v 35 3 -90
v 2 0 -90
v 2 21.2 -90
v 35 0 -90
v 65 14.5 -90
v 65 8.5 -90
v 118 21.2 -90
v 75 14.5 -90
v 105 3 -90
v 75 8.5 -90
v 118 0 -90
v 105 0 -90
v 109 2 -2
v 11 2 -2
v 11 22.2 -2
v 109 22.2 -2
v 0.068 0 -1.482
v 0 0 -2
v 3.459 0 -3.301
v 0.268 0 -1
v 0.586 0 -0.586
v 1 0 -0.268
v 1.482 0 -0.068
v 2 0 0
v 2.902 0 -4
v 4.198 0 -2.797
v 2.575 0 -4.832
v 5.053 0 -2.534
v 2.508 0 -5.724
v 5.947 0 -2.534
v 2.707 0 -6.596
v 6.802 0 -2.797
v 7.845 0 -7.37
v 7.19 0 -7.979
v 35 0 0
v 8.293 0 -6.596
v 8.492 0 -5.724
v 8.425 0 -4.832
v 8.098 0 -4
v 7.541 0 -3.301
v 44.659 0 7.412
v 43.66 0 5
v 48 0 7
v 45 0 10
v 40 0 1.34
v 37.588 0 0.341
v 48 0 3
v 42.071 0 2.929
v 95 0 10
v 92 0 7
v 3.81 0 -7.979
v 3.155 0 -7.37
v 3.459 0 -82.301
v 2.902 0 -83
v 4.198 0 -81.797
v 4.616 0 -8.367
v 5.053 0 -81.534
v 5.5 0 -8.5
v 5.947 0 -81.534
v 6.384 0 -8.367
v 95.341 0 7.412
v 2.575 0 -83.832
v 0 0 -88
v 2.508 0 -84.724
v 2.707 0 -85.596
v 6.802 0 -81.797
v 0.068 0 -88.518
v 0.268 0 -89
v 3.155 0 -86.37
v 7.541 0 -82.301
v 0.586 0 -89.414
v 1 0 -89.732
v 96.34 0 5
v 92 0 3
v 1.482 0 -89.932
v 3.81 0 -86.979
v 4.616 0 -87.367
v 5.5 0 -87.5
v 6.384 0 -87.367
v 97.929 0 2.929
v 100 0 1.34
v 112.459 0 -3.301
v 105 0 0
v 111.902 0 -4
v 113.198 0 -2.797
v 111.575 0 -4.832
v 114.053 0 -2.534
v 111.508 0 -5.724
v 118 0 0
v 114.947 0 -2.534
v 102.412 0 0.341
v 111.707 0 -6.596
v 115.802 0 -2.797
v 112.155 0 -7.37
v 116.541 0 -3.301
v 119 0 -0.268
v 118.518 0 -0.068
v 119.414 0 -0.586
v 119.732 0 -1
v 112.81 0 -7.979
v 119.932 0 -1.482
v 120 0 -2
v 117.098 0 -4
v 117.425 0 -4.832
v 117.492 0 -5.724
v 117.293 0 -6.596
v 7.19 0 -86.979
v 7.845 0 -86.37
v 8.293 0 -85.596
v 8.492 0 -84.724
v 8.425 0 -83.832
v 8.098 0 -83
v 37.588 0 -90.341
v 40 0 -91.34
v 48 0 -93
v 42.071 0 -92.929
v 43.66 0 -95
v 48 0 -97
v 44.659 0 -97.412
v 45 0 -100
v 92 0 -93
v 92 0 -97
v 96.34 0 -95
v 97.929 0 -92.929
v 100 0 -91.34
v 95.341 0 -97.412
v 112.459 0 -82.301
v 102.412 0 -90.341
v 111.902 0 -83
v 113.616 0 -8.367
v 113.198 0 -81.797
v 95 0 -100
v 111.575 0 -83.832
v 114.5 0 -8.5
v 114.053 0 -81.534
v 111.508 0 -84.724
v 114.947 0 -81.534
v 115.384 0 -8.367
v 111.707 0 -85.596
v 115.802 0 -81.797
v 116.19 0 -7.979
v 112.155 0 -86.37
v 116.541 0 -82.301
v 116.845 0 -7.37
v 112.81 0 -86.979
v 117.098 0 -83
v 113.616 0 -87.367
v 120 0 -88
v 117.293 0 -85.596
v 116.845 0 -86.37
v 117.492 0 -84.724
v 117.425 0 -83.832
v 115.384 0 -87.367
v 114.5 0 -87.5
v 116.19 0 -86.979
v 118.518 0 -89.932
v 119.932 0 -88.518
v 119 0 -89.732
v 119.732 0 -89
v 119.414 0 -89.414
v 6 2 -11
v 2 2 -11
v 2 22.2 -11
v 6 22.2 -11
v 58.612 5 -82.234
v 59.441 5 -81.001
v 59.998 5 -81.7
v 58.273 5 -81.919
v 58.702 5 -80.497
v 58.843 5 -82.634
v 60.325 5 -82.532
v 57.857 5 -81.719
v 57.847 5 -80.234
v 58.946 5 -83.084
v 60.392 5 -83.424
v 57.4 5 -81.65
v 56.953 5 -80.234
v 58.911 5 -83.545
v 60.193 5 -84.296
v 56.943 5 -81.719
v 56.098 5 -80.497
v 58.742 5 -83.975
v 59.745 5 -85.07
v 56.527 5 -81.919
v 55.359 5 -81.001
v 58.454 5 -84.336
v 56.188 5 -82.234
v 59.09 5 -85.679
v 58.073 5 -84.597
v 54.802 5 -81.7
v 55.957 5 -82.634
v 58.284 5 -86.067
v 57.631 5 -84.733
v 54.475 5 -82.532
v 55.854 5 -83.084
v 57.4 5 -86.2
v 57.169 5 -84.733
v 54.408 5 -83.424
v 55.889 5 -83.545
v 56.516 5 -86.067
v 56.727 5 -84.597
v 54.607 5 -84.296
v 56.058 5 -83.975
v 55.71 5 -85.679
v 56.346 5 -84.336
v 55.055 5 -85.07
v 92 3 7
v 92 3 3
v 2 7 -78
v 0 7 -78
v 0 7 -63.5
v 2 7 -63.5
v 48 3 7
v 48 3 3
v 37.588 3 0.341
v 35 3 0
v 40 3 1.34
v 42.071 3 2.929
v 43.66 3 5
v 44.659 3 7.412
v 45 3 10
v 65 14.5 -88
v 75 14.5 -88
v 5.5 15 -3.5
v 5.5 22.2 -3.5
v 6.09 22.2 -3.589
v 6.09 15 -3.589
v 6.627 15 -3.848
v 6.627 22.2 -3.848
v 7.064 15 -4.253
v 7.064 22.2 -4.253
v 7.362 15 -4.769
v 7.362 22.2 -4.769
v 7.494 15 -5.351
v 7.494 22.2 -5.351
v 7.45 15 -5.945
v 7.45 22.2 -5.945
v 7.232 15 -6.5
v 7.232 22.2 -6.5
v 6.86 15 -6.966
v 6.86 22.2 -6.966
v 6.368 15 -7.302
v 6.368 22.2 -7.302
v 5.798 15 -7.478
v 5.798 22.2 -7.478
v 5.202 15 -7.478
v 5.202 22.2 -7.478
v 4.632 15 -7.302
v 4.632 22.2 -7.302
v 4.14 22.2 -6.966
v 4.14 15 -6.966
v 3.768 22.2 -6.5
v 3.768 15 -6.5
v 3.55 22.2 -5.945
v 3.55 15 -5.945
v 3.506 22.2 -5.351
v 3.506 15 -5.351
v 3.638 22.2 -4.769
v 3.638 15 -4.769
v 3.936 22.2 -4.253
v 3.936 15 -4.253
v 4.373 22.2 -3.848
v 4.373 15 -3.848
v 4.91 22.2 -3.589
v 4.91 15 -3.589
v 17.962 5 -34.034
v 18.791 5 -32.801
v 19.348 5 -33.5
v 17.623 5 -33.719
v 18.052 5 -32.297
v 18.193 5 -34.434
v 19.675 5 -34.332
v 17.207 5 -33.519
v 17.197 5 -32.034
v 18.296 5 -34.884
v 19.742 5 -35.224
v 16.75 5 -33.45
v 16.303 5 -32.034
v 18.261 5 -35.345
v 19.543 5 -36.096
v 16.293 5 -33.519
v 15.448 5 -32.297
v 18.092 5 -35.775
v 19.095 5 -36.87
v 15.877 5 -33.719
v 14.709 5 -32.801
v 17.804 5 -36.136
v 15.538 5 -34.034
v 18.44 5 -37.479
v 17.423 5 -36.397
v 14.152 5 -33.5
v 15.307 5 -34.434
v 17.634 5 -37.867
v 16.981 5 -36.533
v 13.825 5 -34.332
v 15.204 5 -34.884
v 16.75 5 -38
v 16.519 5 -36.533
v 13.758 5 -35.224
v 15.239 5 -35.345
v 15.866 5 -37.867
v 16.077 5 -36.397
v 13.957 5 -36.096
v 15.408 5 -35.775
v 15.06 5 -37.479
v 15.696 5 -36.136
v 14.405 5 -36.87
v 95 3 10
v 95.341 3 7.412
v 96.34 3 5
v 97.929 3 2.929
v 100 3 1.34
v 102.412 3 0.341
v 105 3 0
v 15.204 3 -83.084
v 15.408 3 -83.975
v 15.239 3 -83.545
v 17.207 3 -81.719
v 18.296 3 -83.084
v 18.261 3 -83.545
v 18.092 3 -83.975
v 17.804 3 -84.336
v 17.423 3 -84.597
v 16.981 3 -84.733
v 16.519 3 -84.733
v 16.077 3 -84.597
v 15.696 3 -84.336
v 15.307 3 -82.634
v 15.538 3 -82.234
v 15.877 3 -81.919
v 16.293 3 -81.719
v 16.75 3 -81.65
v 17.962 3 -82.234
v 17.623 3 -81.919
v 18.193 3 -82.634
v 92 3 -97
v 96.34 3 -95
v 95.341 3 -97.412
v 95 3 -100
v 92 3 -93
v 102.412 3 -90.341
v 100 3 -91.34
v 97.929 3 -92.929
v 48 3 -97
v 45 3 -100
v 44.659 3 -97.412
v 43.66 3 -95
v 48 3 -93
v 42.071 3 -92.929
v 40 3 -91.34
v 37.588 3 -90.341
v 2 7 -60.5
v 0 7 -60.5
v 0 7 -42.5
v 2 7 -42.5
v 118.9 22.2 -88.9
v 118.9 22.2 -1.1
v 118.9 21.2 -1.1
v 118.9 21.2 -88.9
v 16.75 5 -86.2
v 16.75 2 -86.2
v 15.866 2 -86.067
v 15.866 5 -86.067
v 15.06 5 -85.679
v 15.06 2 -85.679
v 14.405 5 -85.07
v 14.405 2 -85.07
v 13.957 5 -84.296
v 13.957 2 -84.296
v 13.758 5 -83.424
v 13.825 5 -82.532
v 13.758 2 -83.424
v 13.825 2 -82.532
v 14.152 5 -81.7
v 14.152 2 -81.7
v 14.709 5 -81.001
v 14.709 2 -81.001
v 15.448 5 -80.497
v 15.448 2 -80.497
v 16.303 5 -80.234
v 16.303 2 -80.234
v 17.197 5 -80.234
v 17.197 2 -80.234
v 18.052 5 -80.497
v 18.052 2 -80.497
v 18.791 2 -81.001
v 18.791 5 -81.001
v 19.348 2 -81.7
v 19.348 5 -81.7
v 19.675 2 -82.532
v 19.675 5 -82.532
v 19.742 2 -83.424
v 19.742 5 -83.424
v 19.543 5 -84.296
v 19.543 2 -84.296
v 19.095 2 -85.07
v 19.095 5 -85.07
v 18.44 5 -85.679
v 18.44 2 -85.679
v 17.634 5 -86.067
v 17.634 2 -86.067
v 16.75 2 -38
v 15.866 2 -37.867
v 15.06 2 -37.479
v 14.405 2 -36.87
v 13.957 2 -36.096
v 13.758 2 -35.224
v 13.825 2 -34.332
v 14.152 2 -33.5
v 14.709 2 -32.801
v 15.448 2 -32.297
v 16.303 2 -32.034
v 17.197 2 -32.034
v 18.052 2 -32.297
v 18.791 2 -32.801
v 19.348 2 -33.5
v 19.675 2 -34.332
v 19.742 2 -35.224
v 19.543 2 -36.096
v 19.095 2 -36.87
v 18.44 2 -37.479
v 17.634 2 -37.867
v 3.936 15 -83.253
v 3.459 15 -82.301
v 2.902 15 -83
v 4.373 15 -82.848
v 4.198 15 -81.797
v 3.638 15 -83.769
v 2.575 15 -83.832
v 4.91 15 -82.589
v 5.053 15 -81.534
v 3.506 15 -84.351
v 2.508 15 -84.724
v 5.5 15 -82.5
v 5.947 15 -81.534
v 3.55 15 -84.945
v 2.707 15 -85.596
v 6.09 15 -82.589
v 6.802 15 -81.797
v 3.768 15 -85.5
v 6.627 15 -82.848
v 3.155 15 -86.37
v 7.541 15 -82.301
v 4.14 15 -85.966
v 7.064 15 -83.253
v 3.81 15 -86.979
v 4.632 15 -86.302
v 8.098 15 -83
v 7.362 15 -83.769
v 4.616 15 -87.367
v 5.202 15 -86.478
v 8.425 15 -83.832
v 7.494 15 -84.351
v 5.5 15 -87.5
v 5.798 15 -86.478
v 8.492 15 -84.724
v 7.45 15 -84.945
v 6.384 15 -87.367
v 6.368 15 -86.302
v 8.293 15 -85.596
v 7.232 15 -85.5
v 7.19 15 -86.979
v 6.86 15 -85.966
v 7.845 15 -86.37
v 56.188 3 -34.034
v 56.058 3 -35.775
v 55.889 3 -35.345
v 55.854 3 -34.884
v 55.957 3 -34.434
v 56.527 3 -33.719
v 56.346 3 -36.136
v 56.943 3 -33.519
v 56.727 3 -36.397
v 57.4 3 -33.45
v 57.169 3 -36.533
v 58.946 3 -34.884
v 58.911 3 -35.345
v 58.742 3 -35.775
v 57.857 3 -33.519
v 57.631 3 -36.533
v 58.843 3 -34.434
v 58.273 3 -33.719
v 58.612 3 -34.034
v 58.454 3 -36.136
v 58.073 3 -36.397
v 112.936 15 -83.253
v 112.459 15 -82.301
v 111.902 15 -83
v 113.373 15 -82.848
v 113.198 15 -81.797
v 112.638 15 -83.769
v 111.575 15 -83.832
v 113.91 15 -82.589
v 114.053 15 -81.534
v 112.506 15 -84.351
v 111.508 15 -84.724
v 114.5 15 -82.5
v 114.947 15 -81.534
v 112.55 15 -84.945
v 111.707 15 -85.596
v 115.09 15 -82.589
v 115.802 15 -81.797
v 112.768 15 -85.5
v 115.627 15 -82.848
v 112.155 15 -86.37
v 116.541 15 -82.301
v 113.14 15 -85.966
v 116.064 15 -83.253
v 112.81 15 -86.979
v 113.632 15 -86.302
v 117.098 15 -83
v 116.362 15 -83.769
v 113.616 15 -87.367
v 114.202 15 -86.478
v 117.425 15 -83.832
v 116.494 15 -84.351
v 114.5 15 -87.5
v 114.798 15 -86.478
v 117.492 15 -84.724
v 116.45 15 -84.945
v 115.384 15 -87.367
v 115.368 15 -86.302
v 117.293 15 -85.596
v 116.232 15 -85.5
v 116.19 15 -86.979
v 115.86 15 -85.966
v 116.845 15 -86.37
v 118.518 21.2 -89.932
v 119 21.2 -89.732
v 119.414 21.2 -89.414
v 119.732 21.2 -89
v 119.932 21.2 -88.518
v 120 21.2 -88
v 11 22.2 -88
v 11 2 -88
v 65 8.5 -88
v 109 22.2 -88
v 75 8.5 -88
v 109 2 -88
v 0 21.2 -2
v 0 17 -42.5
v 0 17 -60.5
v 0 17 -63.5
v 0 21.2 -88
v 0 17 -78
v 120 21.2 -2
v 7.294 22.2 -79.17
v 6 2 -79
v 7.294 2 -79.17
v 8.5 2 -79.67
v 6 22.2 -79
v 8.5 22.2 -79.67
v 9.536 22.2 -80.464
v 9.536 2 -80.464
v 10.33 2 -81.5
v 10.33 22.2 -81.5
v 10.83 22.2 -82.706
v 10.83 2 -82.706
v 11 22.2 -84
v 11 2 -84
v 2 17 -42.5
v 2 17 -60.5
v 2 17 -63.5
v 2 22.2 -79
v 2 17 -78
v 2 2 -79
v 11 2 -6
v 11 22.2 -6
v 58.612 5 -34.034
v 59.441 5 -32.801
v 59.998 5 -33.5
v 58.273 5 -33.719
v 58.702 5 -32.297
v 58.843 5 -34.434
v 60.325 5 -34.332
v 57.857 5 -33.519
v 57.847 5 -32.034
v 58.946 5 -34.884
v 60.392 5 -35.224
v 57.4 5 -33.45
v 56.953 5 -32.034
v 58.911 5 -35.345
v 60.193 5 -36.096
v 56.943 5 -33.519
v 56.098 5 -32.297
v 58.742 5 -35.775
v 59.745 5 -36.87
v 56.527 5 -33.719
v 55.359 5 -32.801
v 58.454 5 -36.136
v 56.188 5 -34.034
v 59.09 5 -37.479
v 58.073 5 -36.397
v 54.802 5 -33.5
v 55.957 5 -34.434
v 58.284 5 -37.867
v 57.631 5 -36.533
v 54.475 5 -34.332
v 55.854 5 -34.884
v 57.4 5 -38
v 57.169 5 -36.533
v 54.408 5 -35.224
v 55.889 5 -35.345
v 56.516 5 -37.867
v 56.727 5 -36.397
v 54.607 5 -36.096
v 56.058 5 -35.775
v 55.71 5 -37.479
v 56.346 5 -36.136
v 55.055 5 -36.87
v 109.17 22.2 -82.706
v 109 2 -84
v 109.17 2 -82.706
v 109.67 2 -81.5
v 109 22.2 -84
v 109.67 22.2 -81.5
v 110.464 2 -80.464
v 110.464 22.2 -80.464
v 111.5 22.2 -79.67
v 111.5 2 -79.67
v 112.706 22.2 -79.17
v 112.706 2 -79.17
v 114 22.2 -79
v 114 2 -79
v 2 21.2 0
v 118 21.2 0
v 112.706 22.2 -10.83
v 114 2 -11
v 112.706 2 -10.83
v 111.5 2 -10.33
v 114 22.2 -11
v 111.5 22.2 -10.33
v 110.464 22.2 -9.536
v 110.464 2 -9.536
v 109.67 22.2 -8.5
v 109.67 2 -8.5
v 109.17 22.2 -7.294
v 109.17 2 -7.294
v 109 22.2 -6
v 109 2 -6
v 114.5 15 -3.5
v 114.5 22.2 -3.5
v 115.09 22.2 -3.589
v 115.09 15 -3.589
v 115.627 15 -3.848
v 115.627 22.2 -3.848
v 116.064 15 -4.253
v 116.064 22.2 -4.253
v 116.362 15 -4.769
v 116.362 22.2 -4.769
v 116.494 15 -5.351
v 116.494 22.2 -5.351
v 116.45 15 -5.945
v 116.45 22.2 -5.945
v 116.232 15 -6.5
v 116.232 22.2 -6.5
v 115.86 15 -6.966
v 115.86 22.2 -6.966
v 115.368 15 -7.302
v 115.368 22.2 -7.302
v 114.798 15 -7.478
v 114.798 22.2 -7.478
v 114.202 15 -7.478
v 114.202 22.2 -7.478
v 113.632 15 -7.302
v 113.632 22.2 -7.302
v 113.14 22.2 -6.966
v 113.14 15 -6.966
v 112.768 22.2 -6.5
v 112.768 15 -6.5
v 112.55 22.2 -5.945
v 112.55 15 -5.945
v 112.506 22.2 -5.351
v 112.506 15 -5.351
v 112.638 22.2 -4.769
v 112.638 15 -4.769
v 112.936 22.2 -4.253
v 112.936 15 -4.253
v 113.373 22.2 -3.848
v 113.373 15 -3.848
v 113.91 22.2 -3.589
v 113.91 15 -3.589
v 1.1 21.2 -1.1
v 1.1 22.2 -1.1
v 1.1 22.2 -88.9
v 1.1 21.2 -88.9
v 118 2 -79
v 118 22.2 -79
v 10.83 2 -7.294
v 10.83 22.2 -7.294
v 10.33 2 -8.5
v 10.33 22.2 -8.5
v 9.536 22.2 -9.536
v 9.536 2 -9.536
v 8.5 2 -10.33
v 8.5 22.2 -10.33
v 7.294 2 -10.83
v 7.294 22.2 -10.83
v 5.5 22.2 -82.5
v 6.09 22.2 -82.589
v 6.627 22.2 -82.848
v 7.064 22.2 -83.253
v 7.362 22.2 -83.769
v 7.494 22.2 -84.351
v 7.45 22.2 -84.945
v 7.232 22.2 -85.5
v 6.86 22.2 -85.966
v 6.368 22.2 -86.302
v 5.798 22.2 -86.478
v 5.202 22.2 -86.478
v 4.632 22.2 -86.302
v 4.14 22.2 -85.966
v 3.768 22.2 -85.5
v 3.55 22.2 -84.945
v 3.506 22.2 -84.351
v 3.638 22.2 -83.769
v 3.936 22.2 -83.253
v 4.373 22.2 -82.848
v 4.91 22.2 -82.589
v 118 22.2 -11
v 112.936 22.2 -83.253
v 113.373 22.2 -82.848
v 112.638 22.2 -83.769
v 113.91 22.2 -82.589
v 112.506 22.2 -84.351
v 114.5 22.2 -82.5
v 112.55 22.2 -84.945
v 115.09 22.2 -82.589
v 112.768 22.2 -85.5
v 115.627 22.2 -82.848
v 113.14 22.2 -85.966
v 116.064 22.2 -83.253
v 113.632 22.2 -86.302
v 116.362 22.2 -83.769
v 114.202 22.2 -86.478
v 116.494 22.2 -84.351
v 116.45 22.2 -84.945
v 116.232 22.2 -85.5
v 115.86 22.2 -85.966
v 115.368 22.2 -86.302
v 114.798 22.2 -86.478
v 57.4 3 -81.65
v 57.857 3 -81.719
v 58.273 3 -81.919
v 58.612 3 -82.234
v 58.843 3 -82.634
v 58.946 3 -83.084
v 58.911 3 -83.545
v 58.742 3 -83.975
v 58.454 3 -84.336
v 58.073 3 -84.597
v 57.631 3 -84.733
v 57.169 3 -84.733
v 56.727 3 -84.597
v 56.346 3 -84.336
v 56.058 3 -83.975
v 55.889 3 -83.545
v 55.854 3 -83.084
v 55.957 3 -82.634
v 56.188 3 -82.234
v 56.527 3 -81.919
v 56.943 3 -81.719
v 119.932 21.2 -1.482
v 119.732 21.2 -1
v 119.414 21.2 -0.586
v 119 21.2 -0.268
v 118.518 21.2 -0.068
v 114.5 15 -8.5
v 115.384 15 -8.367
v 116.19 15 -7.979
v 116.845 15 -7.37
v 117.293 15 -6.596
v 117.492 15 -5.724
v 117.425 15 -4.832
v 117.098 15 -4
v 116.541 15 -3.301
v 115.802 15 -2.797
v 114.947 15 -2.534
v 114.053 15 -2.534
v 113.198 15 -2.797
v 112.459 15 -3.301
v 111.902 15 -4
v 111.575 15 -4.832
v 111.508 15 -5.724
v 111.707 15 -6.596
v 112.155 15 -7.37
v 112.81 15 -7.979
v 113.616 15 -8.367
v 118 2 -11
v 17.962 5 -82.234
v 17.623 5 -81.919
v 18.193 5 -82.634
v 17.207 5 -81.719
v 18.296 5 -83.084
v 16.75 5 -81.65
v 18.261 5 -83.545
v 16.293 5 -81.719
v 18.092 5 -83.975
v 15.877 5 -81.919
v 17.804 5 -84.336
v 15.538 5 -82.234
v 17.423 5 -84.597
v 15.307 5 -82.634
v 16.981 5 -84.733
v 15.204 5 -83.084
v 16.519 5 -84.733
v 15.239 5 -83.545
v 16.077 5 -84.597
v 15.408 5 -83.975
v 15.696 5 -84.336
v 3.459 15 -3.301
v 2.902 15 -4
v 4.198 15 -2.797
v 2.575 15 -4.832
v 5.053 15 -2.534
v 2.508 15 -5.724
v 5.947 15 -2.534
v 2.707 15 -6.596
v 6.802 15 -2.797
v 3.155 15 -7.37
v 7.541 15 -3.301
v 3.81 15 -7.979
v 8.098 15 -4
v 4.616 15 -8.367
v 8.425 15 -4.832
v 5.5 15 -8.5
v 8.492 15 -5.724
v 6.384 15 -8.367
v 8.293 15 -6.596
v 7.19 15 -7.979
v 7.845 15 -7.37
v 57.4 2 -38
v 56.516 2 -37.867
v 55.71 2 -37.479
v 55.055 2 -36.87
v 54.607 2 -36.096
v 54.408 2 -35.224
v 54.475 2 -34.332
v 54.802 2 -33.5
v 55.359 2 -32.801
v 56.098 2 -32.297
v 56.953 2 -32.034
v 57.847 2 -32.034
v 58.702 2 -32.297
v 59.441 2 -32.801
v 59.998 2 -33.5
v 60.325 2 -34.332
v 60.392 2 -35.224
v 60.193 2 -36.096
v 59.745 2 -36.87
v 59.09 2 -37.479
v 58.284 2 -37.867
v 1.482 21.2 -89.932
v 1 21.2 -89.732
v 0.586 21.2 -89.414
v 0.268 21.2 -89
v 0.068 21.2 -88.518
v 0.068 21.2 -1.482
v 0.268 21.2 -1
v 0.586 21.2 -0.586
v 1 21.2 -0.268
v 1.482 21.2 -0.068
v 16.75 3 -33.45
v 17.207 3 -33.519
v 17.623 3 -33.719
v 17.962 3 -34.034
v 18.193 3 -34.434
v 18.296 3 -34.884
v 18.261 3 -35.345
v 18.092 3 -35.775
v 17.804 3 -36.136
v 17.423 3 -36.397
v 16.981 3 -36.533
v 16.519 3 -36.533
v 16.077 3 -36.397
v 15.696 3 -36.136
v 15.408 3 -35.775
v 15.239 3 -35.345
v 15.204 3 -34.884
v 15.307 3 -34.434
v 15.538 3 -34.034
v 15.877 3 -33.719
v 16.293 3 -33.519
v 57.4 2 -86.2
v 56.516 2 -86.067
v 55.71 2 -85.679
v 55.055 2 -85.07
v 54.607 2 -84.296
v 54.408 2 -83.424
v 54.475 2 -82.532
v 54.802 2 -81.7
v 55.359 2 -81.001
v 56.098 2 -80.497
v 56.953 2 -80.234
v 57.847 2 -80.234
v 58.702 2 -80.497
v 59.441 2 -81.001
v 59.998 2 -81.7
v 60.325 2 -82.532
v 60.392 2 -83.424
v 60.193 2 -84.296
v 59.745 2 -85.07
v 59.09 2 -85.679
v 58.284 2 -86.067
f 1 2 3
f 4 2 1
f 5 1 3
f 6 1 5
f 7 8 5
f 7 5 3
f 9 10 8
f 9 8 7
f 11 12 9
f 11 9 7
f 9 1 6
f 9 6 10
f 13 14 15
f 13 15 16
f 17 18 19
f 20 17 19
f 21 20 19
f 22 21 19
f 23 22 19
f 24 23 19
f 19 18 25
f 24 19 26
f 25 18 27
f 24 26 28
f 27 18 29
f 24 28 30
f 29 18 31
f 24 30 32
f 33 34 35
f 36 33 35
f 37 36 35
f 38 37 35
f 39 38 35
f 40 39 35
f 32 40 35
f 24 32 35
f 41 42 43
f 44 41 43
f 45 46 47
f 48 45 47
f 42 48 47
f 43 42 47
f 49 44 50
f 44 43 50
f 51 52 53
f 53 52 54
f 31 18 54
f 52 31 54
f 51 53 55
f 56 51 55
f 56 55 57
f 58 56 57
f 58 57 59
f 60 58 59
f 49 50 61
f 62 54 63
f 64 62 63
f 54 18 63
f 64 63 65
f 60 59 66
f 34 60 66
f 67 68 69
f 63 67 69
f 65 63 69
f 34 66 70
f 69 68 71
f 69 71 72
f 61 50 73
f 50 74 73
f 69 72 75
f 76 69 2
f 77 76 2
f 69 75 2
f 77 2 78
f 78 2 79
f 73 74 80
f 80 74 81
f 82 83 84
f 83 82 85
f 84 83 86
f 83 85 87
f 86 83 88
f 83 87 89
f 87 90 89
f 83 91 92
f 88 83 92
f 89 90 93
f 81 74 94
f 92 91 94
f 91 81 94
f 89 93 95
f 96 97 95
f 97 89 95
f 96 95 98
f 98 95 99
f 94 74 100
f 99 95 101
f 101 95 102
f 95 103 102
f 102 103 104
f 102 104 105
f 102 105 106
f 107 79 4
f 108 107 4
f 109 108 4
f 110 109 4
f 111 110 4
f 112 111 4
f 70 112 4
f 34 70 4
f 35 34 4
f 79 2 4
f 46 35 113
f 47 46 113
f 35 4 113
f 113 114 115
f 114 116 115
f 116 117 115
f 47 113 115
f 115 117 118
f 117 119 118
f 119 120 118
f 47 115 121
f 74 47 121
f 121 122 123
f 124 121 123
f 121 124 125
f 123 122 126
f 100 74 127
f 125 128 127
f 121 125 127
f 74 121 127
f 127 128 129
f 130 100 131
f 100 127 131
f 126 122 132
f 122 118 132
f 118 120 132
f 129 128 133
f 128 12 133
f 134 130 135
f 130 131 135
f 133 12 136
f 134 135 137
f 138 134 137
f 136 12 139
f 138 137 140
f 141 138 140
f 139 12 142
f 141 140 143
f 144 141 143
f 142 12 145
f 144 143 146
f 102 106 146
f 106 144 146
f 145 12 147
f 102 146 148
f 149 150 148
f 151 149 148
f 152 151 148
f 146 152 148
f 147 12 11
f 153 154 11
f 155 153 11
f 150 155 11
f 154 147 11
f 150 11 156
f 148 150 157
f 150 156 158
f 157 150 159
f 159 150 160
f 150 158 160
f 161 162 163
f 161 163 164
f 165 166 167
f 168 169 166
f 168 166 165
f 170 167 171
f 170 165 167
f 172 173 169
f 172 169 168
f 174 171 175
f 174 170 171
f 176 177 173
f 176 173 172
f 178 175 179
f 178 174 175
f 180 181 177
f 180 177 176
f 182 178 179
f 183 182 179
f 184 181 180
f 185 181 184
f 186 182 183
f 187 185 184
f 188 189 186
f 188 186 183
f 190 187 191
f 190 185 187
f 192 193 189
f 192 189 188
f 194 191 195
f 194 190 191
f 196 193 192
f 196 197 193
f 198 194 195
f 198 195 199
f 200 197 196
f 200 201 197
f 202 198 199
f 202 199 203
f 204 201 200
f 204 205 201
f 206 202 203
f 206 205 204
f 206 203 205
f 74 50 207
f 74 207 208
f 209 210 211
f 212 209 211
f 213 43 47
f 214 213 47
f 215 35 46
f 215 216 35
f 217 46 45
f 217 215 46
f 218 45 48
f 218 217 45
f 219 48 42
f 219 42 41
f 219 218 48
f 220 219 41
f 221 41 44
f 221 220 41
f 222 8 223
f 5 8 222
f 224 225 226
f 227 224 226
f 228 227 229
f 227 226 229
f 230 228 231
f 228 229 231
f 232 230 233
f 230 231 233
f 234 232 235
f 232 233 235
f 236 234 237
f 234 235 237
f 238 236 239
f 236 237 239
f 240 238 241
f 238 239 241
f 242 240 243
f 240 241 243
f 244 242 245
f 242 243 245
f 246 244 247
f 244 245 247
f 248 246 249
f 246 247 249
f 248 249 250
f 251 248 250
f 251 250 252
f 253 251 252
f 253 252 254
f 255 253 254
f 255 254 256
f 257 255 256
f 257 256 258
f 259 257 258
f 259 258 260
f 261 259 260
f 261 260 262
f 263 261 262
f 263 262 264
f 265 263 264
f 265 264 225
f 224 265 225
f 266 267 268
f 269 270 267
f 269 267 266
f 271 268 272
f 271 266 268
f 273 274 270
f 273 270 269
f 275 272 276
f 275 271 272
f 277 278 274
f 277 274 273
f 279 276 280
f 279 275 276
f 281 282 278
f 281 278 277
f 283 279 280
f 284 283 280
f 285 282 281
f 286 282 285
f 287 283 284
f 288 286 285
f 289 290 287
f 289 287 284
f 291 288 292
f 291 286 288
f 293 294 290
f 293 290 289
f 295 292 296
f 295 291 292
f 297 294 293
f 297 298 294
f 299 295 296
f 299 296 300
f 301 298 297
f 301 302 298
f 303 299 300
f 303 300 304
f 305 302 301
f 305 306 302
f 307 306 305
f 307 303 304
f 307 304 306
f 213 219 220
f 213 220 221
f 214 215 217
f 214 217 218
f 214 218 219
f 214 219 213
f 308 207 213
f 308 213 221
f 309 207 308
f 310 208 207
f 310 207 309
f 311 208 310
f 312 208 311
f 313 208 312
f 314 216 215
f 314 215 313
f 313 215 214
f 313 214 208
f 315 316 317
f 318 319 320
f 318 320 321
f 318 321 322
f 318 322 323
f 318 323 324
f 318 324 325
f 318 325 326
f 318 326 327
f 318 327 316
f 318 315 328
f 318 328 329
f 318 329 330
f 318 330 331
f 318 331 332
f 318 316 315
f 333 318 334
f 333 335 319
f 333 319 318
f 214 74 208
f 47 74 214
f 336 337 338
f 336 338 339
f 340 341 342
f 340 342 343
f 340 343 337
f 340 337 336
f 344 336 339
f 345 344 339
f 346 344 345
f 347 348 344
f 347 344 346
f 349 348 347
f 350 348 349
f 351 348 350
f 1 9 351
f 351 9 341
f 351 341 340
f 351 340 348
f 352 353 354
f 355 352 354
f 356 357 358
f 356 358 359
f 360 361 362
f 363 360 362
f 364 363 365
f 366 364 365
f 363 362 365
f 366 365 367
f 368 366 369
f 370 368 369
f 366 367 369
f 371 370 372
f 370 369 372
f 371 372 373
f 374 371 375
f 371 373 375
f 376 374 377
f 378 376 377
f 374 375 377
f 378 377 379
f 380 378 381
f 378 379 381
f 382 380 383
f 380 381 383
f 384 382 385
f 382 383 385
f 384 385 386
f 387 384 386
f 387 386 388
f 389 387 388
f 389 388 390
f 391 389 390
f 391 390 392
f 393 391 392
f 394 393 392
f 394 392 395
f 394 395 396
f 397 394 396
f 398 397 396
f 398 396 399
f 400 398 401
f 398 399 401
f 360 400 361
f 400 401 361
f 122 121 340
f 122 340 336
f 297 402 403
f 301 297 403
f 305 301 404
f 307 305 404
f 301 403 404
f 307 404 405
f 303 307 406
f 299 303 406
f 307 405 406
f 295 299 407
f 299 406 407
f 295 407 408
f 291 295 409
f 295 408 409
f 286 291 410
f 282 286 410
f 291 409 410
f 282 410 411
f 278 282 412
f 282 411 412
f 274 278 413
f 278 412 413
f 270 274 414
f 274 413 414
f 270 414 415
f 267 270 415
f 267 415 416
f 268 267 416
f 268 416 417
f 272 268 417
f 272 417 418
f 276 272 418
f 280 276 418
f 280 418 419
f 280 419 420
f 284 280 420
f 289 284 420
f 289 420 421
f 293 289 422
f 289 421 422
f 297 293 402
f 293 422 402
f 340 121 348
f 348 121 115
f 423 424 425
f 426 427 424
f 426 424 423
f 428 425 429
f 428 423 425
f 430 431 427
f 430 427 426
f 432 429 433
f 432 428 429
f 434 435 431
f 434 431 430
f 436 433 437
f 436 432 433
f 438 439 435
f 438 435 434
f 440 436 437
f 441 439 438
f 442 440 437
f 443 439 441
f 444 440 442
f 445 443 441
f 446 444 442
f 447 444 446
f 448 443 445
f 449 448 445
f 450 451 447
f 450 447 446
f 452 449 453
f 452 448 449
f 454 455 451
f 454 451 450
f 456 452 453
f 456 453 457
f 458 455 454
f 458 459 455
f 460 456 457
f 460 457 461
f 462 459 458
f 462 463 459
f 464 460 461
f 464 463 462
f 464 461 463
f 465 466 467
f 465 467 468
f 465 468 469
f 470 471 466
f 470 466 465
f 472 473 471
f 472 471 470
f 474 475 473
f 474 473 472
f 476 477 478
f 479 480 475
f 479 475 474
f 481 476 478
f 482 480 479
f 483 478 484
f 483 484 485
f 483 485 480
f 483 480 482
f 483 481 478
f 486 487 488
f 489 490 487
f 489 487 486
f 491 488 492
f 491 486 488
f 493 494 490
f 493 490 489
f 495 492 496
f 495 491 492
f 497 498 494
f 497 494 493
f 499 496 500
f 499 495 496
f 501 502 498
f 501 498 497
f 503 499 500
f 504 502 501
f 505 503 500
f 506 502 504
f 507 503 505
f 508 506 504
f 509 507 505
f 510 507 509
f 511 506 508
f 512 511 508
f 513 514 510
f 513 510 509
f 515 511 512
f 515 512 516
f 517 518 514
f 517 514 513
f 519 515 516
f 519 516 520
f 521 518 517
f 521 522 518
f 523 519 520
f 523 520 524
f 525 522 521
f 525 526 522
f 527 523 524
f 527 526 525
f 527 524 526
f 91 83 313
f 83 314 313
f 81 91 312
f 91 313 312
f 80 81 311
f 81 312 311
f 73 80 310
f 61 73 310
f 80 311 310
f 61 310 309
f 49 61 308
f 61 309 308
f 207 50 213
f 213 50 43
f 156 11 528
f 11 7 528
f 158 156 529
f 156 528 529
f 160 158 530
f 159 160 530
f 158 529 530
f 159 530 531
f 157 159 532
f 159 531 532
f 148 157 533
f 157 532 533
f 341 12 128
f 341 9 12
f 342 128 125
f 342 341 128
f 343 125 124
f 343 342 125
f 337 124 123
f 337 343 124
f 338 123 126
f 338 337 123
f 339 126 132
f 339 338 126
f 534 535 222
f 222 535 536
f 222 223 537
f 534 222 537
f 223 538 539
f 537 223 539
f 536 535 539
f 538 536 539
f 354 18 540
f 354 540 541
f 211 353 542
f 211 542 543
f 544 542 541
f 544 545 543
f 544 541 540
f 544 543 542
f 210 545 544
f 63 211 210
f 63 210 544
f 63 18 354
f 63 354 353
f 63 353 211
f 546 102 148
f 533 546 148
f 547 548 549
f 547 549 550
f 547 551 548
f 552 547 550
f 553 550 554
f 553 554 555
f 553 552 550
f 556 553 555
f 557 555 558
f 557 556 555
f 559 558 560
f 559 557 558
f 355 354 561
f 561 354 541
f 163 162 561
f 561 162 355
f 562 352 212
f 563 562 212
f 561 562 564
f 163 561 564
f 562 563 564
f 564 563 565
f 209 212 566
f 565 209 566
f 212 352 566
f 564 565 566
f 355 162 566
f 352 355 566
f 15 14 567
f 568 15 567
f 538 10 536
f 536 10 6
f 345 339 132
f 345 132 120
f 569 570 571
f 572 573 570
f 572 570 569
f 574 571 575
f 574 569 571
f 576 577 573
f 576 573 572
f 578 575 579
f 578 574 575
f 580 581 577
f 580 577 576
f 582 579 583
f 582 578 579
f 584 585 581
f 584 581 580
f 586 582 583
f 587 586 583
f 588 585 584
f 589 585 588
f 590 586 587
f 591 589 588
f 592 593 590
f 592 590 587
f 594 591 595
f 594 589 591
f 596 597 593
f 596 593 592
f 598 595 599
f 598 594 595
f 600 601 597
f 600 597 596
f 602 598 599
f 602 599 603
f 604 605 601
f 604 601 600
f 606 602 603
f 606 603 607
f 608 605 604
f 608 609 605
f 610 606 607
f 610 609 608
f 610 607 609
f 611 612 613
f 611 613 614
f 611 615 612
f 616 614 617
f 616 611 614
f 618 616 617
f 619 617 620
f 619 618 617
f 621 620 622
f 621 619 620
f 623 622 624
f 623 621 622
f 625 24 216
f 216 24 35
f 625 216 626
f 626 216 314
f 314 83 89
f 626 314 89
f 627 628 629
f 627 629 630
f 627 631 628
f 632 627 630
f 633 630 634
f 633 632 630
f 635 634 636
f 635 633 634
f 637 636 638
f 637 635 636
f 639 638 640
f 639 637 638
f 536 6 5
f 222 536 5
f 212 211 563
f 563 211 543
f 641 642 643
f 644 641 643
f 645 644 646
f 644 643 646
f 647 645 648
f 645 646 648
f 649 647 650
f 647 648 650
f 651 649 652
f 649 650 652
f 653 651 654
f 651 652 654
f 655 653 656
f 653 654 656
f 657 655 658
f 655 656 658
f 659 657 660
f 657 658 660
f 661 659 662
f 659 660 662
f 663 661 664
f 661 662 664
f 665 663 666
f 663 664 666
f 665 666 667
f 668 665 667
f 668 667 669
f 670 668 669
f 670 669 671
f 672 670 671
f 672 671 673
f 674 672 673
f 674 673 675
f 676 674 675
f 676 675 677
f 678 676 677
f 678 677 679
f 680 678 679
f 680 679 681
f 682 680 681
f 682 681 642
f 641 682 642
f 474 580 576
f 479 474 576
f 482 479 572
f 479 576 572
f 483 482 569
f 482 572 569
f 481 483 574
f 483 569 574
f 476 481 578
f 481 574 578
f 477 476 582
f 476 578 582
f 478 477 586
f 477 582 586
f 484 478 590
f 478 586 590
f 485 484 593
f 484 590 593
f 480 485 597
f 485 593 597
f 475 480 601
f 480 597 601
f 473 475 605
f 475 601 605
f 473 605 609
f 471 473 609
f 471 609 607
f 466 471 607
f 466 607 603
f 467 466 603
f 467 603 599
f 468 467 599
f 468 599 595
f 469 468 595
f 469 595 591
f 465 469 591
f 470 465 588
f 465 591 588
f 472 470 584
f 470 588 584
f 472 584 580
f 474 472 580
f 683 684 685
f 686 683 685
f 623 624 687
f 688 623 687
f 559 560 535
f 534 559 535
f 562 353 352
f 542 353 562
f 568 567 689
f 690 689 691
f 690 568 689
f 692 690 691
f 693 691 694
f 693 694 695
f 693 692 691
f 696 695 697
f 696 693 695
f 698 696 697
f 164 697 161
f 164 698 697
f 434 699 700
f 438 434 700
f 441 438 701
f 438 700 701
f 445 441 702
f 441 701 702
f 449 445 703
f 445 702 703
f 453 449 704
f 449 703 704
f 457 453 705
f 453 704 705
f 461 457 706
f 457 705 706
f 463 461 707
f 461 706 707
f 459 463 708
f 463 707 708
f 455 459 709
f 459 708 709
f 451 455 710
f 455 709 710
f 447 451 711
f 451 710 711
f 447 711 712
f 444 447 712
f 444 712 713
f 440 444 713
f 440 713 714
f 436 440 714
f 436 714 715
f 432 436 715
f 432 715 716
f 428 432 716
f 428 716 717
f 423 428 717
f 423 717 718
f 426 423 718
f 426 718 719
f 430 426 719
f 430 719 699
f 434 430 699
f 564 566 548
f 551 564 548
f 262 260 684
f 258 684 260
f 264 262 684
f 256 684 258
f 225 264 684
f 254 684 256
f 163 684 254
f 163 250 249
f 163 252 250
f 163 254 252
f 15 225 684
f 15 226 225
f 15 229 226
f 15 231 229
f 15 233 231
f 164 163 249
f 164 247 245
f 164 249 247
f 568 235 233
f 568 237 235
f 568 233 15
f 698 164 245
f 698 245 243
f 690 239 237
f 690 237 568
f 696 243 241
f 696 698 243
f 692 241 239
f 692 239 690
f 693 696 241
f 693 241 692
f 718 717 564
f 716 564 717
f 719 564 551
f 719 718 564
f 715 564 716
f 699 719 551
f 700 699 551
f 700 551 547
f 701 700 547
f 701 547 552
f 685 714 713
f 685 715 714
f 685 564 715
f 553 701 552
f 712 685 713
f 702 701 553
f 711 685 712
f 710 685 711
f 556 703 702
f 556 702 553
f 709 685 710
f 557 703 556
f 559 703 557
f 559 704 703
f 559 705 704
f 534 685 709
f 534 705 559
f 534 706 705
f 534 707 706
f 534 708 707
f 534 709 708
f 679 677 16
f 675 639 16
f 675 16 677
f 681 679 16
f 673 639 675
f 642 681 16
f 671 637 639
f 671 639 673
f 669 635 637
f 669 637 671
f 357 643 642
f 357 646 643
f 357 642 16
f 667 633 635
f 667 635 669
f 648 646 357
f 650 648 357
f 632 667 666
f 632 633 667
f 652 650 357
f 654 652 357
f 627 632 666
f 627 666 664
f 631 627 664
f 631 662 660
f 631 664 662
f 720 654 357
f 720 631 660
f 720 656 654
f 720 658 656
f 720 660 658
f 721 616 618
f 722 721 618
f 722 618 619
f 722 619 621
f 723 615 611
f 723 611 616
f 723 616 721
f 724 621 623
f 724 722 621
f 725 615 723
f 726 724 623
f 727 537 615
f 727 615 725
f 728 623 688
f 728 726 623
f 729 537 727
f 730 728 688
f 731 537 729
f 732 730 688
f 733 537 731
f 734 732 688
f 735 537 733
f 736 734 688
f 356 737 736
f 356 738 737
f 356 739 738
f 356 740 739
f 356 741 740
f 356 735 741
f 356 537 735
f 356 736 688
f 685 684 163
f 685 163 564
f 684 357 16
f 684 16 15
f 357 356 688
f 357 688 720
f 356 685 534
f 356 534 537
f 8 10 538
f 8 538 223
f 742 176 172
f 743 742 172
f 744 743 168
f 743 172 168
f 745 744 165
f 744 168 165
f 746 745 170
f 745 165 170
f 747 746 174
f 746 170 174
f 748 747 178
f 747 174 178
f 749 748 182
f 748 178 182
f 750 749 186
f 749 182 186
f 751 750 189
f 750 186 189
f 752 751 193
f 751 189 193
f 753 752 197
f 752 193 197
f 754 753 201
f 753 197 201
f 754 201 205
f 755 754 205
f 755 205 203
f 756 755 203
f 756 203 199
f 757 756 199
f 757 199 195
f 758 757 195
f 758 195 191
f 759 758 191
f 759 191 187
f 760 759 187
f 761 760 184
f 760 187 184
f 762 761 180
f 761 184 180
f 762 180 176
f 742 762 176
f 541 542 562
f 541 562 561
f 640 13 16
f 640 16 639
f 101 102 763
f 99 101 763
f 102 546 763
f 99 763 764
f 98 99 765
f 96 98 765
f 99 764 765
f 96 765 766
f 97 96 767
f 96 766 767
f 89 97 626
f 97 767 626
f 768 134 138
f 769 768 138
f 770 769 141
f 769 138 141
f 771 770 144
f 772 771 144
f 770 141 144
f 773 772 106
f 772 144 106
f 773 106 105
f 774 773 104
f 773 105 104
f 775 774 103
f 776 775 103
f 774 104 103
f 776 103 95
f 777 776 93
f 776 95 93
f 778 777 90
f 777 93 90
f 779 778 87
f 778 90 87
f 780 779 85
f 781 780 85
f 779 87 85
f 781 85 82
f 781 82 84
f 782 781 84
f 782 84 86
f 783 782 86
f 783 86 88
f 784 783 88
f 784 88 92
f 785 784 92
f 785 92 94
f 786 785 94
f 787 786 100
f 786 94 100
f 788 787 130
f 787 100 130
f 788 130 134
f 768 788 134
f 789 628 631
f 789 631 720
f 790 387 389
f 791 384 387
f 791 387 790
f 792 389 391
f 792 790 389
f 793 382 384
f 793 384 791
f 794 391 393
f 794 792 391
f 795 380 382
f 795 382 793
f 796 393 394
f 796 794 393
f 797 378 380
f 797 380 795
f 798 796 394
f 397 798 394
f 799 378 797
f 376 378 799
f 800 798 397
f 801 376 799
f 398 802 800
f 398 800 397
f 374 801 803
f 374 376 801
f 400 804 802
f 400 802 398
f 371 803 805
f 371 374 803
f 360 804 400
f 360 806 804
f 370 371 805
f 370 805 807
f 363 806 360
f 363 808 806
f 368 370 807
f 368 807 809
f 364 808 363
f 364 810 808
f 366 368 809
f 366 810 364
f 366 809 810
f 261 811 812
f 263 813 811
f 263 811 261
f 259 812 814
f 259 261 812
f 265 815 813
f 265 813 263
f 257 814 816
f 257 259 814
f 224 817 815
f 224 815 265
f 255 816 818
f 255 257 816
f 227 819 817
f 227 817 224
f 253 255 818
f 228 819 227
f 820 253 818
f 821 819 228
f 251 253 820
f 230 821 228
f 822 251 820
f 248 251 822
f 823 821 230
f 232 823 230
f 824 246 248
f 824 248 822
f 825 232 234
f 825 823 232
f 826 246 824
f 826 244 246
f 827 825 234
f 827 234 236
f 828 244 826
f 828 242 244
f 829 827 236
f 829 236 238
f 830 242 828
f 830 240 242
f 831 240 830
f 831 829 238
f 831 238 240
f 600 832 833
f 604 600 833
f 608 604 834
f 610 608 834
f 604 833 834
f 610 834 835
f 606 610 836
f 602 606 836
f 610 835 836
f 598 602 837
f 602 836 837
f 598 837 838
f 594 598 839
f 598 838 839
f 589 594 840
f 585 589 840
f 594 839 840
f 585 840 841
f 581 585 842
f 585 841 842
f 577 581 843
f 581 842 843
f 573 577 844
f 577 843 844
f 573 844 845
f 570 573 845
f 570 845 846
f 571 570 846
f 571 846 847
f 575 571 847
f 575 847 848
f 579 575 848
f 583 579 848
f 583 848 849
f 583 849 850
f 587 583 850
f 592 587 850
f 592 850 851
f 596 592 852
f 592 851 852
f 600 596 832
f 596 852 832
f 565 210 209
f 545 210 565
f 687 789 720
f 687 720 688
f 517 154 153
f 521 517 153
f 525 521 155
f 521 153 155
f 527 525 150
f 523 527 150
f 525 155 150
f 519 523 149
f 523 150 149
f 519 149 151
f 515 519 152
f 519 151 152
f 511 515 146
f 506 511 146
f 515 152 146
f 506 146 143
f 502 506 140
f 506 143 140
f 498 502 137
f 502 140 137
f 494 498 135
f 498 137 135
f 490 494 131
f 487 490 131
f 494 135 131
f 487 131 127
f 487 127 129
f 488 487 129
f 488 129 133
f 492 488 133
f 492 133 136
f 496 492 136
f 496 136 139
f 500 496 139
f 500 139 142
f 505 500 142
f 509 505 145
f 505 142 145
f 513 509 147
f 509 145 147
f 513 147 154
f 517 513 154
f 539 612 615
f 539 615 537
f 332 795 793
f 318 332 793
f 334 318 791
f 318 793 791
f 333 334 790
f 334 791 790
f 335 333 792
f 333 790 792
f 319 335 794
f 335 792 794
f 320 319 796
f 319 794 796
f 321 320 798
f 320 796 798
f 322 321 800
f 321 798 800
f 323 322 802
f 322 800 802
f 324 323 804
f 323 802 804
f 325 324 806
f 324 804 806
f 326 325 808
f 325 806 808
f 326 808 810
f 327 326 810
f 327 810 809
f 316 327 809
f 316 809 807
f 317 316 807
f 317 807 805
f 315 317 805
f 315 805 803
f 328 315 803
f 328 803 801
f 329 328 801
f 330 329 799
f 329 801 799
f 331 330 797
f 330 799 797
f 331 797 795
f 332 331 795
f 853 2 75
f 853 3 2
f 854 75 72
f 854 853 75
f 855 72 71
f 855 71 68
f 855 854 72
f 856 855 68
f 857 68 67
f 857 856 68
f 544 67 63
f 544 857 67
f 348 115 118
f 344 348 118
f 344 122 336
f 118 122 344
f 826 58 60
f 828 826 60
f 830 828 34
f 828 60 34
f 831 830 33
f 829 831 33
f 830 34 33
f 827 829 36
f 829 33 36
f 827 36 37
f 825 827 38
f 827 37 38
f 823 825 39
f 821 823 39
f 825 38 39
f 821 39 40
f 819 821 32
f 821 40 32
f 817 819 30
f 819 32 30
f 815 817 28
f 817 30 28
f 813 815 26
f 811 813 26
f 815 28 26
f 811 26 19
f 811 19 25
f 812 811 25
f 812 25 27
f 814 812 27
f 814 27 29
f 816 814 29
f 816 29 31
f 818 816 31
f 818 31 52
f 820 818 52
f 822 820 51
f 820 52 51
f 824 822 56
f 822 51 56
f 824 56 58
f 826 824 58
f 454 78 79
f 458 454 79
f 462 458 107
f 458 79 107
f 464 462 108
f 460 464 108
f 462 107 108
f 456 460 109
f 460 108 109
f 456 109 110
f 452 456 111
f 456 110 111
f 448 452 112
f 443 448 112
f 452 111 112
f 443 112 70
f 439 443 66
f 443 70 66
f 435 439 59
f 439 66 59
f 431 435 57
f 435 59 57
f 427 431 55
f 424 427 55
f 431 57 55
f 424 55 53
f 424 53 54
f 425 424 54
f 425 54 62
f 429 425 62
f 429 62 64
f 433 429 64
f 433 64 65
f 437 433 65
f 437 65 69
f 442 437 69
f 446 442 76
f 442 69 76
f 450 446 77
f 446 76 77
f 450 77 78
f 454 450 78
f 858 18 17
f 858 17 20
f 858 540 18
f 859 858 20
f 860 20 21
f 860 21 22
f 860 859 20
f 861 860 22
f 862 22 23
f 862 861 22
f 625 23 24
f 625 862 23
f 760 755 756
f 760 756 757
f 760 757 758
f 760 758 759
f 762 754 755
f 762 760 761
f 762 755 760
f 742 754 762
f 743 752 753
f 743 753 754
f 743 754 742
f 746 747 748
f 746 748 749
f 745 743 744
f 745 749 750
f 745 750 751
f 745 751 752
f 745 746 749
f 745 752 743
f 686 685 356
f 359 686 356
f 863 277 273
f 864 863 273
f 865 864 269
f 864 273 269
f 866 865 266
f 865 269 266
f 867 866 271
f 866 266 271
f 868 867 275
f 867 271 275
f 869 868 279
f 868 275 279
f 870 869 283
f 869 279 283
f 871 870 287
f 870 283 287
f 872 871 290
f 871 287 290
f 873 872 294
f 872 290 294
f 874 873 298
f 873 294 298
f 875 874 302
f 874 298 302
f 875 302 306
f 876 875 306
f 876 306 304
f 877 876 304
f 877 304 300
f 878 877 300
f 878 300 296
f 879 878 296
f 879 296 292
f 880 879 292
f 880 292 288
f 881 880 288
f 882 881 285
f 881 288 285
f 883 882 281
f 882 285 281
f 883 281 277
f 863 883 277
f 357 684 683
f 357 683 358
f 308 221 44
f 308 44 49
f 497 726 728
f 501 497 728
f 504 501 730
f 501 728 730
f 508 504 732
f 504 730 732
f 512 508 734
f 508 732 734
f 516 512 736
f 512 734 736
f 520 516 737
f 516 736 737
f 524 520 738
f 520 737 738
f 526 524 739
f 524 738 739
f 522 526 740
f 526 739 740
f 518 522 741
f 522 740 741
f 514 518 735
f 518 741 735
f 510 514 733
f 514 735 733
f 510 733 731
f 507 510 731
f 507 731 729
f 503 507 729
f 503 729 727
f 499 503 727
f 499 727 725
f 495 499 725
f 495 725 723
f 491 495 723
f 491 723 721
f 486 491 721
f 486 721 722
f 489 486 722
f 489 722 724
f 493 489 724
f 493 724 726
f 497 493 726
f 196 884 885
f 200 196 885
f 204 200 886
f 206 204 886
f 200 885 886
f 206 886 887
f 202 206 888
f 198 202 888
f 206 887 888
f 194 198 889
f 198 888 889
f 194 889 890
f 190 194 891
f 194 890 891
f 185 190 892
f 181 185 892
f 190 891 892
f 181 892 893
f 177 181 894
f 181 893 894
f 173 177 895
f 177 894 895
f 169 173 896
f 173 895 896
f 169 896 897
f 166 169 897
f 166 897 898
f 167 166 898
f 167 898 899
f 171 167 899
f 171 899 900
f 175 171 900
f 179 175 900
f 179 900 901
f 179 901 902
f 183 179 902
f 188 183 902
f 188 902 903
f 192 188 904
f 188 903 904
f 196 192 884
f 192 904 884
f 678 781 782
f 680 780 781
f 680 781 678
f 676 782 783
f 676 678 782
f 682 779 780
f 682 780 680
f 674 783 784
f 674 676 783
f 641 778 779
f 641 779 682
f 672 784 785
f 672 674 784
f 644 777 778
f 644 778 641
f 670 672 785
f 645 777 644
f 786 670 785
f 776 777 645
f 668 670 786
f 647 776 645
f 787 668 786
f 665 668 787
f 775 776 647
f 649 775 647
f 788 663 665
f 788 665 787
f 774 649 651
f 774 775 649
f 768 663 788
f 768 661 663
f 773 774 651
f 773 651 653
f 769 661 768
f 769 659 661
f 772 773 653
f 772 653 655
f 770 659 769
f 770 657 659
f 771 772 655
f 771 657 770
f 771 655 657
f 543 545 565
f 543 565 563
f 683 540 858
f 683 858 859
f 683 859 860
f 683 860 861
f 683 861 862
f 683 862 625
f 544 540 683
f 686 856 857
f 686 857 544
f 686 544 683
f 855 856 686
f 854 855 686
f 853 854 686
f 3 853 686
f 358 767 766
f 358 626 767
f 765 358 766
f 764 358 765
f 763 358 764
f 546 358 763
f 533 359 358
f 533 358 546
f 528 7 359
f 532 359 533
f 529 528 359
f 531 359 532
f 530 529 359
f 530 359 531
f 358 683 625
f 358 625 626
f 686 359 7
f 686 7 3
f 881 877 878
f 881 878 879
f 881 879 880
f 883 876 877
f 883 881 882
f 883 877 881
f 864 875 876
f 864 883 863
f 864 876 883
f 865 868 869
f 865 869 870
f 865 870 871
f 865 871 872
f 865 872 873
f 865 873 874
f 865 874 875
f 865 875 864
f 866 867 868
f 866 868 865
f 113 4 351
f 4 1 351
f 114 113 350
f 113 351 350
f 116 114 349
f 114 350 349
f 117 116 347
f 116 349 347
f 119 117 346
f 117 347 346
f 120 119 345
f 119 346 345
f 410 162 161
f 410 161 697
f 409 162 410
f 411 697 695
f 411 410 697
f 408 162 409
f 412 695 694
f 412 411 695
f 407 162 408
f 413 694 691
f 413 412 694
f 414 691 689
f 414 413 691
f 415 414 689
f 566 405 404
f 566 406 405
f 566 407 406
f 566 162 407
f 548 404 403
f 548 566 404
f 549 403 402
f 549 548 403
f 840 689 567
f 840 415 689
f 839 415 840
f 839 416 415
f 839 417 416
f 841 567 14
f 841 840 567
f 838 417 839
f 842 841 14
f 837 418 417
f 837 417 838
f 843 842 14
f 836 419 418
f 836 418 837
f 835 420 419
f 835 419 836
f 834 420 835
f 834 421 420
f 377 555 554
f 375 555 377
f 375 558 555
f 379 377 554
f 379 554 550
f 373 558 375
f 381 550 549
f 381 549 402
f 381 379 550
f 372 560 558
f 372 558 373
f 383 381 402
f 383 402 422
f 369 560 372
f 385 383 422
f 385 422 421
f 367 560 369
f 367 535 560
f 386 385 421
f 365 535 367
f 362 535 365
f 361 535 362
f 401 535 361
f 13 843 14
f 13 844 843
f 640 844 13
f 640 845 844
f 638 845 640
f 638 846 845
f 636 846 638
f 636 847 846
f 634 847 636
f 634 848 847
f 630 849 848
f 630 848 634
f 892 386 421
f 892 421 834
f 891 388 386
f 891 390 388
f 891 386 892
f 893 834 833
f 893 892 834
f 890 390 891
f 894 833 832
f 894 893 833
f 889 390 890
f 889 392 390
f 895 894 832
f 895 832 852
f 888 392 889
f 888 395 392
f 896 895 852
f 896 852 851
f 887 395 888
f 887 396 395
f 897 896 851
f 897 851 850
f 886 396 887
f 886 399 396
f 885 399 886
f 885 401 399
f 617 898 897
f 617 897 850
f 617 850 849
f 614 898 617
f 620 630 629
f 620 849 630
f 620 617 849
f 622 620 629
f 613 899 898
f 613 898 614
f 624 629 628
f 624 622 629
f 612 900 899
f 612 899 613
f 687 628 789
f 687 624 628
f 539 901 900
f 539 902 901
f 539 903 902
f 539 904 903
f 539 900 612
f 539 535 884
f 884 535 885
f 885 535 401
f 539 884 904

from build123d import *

# Parameters (mm, degrees)
SKETCH1_W           = 120
SKETCH1_H           = 90
BOSS_EXTRUDE1_DEPTH = 22.2
SHELL1_T            = -2
SKETCH2_W           = 9
SKETCH2_H           = 9
BOSS_EXTRUDE2_DEPTH = 20.2
SKETCH5_W           = 120
SKETCH5_H           = 90
SKETCH5_W_2         = 117.8
SKETCH5_H_2         = 87.8
CUT_EXTRUDE2_DEPTH  = 1
SKETCH6_R           = 2
CUT_EXTRUDE3_DEPTH  = 25
SKETCH13_R          = 3
CUT_EXTRUDE8_DEPTH  = 15
SKETCH14_W          = 50
SKETCH14_H          = 3
BOSS_EXTRUDE4_DEPTH = 10
SKETCH15_W          = 44
SKETCH15_H          = 4
CUT_EXTRUDE9_DEPTH  = 10
SKETCH16_W          = 50
SKETCH16_H          = 3
BOSS_EXTRUDE5_DEPTH = 10
SKETCH17_W          = 44
SKETCH17_H          = 4
CUT_EXTRUDE10_DEPTH = 10
SKETCH22_W          = 14.5
SKETCH22_H          = 10
SKETCH22_W_2        = 18
CUT_EXTRUDE15_DEPTH = 10
SKETCH23_W          = 10
SKETCH23_H          = 6
CUT_EXTRUDE16_DEPTH = 10
FILLET1_R           = 10
FILLET4_R           = 5
FILLET9_R           = 2
SKETCH26_R          = 3
BOSS_EXTRUDE7_DEPTH = 3
SKETCH27_R          = 1.55
CUT_EXTRUDE17_DEPTH = 2


with BuildPart() as part:
    # Sketch1 → Boss-Extrude1 (new body)
    with BuildSketch(Plane(origin=(0, 0, 0), x_dir=(1, 0, 0), z_dir=(0, 1, 0))):
        with Locations((60, 45)):
            Rectangle(SKETCH1_W, SKETCH1_H)
    extrude(amount=BOSS_EXTRUDE1_DEPTH)

    # Shell1
    shell1_openings = [part.faces().sort_by_distance(p)[0] for p in [
        (60, 22.2, -45),
    ]]
    offset(amount=SHELL1_T, openings=shell1_openings, kind=Kind.INTERSECTION)

    # Sketch2 → Boss-Extrude2 (add)
    with BuildSketch(Plane(origin=(0, 2, 0), x_dir=(1, 0, 0), z_dir=(0, 1, 0))):
        with Locations((6.5, 6.5)):
            Rectangle(SKETCH2_W, SKETCH2_H)
        with Locations((113.5, 83.5)):
            Rectangle(SKETCH2_W, SKETCH2_H)
        with Locations((113.5, 6.5)):
            Rectangle(SKETCH2_W, SKETCH2_H)
        with Locations((6.5, 83.5)):
            Rectangle(SKETCH2_W, SKETCH2_H)
    extrude(amount=BOSS_EXTRUDE2_DEPTH)

    # Sketch5 → Cut-Extrude2 (cut)
    with BuildSketch(Plane(origin=(0, 22.2, 0), x_dir=(1, 0, 0), z_dir=(0, 1, 0))):
        with Locations((60, 45)):
            Rectangle(SKETCH5_W, SKETCH5_H)
        with Locations((60, 45)):
            Rectangle(SKETCH5_W_2, SKETCH5_H_2, mode=Mode.SUBTRACT)
    extrude(amount=-CUT_EXTRUDE2_DEPTH, mode=Mode.SUBTRACT)

    # Sketch6 → Cut-Extrude3 (cut)
    with BuildSketch(Plane(origin=(0, 22.2, 0), x_dir=(1, 0, 0), z_dir=(0, 1, 0))):
        with Locations(Location((114.5, 84.5, 0), (0, 0, 270))):
            Circle(SKETCH6_R)
        with Locations(Location((114.5, 5.5, 0), (0, 0, 270))):
            Circle(SKETCH6_R)
        with Locations(Location((5.5, 84.5, 0), (0, 0, 270))):
            Circle(SKETCH6_R)
        with Locations(Location((5.5, 5.5, 0), (0, 0, 270))):
            Circle(SKETCH6_R)
    extrude(amount=-CUT_EXTRUDE3_DEPTH, mode=Mode.SUBTRACT)

    # Sketch13 → Cut-Extrude8 (cut)
    with BuildSketch(Plane.XZ):
        with Locations(Location((114.5, -5.5, 0), (0, 0, 270))):
            Circle(SKETCH13_R)
        with Locations(Location((114.5, -84.5, 0), (0, 0, 270))):
            Circle(SKETCH13_R)
        with Locations(Location((5.5, -5.5, 0), (0, 0, 270))):
            Circle(SKETCH13_R)
        with Locations(Location((5.5, -84.5, 0), (0, 0, 270))):
            Circle(SKETCH13_R)
    extrude(amount=-CUT_EXTRUDE8_DEPTH, mode=Mode.SUBTRACT)

    # Sketch14 → Boss-Extrude4 (add)
    with BuildSketch(Plane.XY):
        with Locations((70, 1.5)):
            Rectangle(SKETCH14_W, SKETCH14_H)
    extrude(amount=BOSS_EXTRUDE4_DEPTH)

    # Sketch15 → Cut-Extrude9 (cut)
    with BuildSketch(Plane(origin=(0, 0, 0), x_dir=(-1, 0, 0), z_dir=(0, -1, 0))):
        with Locations((-70, -5)):
            Rectangle(SKETCH15_W, SKETCH15_H)
    extrude(amount=-CUT_EXTRUDE9_DEPTH, mode=Mode.SUBTRACT)

    # Sketch16 → Boss-Extrude5 (add)
    with BuildSketch(Plane(origin=(0, 0, -90), x_dir=(-1, 0, 0), z_dir=(0, 0, -1))):
        with Locations((-70, 1.5)):
            Rectangle(SKETCH16_W, SKETCH16_H)
    extrude(amount=BOSS_EXTRUDE5_DEPTH)

    # Sketch17 → Cut-Extrude10 (cut)
    with BuildSketch(Plane(origin=(0, 0, 0), x_dir=(-1, 0, 0), z_dir=(0, -1, 0))):
        with Locations((-70, 95)):
            Rectangle(SKETCH17_W, SKETCH17_H)
    extrude(amount=-CUT_EXTRUDE10_DEPTH, mode=Mode.SUBTRACT)

    # Sketch22 → Cut-Extrude15 (cut)
    with BuildSketch(Plane.ZY):
        with Locations((-70.75, 12)):
            Rectangle(SKETCH22_W, SKETCH22_H)
        with Locations((-51.5, 12)):
            Rectangle(SKETCH22_W_2, SKETCH22_H)
    extrude(amount=-CUT_EXTRUDE15_DEPTH, mode=Mode.SUBTRACT)

    # Sketch23 → Cut-Extrude16 (cut)
    with BuildSketch(Plane(origin=(0, 0, -90), x_dir=(-1, 0, 0), z_dir=(0, 0, -1))):
        with Locations((-70, 11.5)):
            Rectangle(SKETCH23_W, SKETCH23_H)
    extrude(amount=-CUT_EXTRUDE16_DEPTH, mode=Mode.SUBTRACT)

    # Fillet1
    fillet1_edges = [part.edges().sort_by_distance(p)[0] for p in [
        (95, 1.5, -90),
        (95, 1.5, 0),
        (45, 1.5, 0),
        (45, 1.5, -90),
    ]]
    fillet(fillet1_edges, radius=FILLET1_R - 0.0001)  # a hair under: the kernel refuses the full size

    # Fillet4
    fillet4_edges = [part.edges().sort_by_distance(p)[0] for p in [
        (11, 12.1, -11),
        (109, 12.1, -79),
        (11, 12.1, -79),
        (109, 12.1, -11),
    ]]
    fillet(fillet4_edges, radius=FILLET4_R)

    # Fillet9
    fillet9_edges = [part.edges().sort_by_distance(p)[0] for p in [
        (0, 10.6, -90),
        (120, 10.6, -90),
        (120, 10.6, 0),
        (0, 10.6, 0),
    ]]
    fillet(fillet9_edges, radius=FILLET9_R)

    # Sketch26 → Boss-Extrude7 (add)
    with BuildSketch(Plane(origin=(0, 2, 0), x_dir=(1, 0, 0), z_dir=(0, 1, 0))):
        with Locations(Location((16.75, 83.2, 0), (0, 0, 90))):
            Circle(SKETCH26_R)
        with Locations(Location((16.75, 35, 0), (0, 0, 90))):
            Circle(SKETCH26_R)
        with Locations(Location((57.4, 35, 0), (0, 0, 90))):
            Circle(SKETCH26_R)
        with Locations(Location((57.4, 83.2, 0), (0, 0, 90))):
            Circle(SKETCH26_R)
    extrude(amount=BOSS_EXTRUDE7_DEPTH)

    # Sketch27 → Cut-Extrude17 (cut)
    with BuildSketch(Plane(origin=(0, 5, 0), x_dir=(1, 0, 0), z_dir=(0, 1, 0))):
        with Locations(Location((57.4, 83.2, 0), (0, 0, 270))):
            Circle(SKETCH27_R)
        with Locations(Location((57.4, 35, 0), (0, 0, 270))):
            Circle(SKETCH27_R)
        with Locations(Location((16.75, 35, 0), (0, 0, 270))):
            Circle(SKETCH27_R)
        with Locations(Location((16.75, 83.2, 0), (0, 0, 270))):
            Circle(SKETCH27_R)
    extrude(amount=-CUT_EXTRUDE17_DEPTH, mode=Mode.SUBTRACT)


solid = part.part
